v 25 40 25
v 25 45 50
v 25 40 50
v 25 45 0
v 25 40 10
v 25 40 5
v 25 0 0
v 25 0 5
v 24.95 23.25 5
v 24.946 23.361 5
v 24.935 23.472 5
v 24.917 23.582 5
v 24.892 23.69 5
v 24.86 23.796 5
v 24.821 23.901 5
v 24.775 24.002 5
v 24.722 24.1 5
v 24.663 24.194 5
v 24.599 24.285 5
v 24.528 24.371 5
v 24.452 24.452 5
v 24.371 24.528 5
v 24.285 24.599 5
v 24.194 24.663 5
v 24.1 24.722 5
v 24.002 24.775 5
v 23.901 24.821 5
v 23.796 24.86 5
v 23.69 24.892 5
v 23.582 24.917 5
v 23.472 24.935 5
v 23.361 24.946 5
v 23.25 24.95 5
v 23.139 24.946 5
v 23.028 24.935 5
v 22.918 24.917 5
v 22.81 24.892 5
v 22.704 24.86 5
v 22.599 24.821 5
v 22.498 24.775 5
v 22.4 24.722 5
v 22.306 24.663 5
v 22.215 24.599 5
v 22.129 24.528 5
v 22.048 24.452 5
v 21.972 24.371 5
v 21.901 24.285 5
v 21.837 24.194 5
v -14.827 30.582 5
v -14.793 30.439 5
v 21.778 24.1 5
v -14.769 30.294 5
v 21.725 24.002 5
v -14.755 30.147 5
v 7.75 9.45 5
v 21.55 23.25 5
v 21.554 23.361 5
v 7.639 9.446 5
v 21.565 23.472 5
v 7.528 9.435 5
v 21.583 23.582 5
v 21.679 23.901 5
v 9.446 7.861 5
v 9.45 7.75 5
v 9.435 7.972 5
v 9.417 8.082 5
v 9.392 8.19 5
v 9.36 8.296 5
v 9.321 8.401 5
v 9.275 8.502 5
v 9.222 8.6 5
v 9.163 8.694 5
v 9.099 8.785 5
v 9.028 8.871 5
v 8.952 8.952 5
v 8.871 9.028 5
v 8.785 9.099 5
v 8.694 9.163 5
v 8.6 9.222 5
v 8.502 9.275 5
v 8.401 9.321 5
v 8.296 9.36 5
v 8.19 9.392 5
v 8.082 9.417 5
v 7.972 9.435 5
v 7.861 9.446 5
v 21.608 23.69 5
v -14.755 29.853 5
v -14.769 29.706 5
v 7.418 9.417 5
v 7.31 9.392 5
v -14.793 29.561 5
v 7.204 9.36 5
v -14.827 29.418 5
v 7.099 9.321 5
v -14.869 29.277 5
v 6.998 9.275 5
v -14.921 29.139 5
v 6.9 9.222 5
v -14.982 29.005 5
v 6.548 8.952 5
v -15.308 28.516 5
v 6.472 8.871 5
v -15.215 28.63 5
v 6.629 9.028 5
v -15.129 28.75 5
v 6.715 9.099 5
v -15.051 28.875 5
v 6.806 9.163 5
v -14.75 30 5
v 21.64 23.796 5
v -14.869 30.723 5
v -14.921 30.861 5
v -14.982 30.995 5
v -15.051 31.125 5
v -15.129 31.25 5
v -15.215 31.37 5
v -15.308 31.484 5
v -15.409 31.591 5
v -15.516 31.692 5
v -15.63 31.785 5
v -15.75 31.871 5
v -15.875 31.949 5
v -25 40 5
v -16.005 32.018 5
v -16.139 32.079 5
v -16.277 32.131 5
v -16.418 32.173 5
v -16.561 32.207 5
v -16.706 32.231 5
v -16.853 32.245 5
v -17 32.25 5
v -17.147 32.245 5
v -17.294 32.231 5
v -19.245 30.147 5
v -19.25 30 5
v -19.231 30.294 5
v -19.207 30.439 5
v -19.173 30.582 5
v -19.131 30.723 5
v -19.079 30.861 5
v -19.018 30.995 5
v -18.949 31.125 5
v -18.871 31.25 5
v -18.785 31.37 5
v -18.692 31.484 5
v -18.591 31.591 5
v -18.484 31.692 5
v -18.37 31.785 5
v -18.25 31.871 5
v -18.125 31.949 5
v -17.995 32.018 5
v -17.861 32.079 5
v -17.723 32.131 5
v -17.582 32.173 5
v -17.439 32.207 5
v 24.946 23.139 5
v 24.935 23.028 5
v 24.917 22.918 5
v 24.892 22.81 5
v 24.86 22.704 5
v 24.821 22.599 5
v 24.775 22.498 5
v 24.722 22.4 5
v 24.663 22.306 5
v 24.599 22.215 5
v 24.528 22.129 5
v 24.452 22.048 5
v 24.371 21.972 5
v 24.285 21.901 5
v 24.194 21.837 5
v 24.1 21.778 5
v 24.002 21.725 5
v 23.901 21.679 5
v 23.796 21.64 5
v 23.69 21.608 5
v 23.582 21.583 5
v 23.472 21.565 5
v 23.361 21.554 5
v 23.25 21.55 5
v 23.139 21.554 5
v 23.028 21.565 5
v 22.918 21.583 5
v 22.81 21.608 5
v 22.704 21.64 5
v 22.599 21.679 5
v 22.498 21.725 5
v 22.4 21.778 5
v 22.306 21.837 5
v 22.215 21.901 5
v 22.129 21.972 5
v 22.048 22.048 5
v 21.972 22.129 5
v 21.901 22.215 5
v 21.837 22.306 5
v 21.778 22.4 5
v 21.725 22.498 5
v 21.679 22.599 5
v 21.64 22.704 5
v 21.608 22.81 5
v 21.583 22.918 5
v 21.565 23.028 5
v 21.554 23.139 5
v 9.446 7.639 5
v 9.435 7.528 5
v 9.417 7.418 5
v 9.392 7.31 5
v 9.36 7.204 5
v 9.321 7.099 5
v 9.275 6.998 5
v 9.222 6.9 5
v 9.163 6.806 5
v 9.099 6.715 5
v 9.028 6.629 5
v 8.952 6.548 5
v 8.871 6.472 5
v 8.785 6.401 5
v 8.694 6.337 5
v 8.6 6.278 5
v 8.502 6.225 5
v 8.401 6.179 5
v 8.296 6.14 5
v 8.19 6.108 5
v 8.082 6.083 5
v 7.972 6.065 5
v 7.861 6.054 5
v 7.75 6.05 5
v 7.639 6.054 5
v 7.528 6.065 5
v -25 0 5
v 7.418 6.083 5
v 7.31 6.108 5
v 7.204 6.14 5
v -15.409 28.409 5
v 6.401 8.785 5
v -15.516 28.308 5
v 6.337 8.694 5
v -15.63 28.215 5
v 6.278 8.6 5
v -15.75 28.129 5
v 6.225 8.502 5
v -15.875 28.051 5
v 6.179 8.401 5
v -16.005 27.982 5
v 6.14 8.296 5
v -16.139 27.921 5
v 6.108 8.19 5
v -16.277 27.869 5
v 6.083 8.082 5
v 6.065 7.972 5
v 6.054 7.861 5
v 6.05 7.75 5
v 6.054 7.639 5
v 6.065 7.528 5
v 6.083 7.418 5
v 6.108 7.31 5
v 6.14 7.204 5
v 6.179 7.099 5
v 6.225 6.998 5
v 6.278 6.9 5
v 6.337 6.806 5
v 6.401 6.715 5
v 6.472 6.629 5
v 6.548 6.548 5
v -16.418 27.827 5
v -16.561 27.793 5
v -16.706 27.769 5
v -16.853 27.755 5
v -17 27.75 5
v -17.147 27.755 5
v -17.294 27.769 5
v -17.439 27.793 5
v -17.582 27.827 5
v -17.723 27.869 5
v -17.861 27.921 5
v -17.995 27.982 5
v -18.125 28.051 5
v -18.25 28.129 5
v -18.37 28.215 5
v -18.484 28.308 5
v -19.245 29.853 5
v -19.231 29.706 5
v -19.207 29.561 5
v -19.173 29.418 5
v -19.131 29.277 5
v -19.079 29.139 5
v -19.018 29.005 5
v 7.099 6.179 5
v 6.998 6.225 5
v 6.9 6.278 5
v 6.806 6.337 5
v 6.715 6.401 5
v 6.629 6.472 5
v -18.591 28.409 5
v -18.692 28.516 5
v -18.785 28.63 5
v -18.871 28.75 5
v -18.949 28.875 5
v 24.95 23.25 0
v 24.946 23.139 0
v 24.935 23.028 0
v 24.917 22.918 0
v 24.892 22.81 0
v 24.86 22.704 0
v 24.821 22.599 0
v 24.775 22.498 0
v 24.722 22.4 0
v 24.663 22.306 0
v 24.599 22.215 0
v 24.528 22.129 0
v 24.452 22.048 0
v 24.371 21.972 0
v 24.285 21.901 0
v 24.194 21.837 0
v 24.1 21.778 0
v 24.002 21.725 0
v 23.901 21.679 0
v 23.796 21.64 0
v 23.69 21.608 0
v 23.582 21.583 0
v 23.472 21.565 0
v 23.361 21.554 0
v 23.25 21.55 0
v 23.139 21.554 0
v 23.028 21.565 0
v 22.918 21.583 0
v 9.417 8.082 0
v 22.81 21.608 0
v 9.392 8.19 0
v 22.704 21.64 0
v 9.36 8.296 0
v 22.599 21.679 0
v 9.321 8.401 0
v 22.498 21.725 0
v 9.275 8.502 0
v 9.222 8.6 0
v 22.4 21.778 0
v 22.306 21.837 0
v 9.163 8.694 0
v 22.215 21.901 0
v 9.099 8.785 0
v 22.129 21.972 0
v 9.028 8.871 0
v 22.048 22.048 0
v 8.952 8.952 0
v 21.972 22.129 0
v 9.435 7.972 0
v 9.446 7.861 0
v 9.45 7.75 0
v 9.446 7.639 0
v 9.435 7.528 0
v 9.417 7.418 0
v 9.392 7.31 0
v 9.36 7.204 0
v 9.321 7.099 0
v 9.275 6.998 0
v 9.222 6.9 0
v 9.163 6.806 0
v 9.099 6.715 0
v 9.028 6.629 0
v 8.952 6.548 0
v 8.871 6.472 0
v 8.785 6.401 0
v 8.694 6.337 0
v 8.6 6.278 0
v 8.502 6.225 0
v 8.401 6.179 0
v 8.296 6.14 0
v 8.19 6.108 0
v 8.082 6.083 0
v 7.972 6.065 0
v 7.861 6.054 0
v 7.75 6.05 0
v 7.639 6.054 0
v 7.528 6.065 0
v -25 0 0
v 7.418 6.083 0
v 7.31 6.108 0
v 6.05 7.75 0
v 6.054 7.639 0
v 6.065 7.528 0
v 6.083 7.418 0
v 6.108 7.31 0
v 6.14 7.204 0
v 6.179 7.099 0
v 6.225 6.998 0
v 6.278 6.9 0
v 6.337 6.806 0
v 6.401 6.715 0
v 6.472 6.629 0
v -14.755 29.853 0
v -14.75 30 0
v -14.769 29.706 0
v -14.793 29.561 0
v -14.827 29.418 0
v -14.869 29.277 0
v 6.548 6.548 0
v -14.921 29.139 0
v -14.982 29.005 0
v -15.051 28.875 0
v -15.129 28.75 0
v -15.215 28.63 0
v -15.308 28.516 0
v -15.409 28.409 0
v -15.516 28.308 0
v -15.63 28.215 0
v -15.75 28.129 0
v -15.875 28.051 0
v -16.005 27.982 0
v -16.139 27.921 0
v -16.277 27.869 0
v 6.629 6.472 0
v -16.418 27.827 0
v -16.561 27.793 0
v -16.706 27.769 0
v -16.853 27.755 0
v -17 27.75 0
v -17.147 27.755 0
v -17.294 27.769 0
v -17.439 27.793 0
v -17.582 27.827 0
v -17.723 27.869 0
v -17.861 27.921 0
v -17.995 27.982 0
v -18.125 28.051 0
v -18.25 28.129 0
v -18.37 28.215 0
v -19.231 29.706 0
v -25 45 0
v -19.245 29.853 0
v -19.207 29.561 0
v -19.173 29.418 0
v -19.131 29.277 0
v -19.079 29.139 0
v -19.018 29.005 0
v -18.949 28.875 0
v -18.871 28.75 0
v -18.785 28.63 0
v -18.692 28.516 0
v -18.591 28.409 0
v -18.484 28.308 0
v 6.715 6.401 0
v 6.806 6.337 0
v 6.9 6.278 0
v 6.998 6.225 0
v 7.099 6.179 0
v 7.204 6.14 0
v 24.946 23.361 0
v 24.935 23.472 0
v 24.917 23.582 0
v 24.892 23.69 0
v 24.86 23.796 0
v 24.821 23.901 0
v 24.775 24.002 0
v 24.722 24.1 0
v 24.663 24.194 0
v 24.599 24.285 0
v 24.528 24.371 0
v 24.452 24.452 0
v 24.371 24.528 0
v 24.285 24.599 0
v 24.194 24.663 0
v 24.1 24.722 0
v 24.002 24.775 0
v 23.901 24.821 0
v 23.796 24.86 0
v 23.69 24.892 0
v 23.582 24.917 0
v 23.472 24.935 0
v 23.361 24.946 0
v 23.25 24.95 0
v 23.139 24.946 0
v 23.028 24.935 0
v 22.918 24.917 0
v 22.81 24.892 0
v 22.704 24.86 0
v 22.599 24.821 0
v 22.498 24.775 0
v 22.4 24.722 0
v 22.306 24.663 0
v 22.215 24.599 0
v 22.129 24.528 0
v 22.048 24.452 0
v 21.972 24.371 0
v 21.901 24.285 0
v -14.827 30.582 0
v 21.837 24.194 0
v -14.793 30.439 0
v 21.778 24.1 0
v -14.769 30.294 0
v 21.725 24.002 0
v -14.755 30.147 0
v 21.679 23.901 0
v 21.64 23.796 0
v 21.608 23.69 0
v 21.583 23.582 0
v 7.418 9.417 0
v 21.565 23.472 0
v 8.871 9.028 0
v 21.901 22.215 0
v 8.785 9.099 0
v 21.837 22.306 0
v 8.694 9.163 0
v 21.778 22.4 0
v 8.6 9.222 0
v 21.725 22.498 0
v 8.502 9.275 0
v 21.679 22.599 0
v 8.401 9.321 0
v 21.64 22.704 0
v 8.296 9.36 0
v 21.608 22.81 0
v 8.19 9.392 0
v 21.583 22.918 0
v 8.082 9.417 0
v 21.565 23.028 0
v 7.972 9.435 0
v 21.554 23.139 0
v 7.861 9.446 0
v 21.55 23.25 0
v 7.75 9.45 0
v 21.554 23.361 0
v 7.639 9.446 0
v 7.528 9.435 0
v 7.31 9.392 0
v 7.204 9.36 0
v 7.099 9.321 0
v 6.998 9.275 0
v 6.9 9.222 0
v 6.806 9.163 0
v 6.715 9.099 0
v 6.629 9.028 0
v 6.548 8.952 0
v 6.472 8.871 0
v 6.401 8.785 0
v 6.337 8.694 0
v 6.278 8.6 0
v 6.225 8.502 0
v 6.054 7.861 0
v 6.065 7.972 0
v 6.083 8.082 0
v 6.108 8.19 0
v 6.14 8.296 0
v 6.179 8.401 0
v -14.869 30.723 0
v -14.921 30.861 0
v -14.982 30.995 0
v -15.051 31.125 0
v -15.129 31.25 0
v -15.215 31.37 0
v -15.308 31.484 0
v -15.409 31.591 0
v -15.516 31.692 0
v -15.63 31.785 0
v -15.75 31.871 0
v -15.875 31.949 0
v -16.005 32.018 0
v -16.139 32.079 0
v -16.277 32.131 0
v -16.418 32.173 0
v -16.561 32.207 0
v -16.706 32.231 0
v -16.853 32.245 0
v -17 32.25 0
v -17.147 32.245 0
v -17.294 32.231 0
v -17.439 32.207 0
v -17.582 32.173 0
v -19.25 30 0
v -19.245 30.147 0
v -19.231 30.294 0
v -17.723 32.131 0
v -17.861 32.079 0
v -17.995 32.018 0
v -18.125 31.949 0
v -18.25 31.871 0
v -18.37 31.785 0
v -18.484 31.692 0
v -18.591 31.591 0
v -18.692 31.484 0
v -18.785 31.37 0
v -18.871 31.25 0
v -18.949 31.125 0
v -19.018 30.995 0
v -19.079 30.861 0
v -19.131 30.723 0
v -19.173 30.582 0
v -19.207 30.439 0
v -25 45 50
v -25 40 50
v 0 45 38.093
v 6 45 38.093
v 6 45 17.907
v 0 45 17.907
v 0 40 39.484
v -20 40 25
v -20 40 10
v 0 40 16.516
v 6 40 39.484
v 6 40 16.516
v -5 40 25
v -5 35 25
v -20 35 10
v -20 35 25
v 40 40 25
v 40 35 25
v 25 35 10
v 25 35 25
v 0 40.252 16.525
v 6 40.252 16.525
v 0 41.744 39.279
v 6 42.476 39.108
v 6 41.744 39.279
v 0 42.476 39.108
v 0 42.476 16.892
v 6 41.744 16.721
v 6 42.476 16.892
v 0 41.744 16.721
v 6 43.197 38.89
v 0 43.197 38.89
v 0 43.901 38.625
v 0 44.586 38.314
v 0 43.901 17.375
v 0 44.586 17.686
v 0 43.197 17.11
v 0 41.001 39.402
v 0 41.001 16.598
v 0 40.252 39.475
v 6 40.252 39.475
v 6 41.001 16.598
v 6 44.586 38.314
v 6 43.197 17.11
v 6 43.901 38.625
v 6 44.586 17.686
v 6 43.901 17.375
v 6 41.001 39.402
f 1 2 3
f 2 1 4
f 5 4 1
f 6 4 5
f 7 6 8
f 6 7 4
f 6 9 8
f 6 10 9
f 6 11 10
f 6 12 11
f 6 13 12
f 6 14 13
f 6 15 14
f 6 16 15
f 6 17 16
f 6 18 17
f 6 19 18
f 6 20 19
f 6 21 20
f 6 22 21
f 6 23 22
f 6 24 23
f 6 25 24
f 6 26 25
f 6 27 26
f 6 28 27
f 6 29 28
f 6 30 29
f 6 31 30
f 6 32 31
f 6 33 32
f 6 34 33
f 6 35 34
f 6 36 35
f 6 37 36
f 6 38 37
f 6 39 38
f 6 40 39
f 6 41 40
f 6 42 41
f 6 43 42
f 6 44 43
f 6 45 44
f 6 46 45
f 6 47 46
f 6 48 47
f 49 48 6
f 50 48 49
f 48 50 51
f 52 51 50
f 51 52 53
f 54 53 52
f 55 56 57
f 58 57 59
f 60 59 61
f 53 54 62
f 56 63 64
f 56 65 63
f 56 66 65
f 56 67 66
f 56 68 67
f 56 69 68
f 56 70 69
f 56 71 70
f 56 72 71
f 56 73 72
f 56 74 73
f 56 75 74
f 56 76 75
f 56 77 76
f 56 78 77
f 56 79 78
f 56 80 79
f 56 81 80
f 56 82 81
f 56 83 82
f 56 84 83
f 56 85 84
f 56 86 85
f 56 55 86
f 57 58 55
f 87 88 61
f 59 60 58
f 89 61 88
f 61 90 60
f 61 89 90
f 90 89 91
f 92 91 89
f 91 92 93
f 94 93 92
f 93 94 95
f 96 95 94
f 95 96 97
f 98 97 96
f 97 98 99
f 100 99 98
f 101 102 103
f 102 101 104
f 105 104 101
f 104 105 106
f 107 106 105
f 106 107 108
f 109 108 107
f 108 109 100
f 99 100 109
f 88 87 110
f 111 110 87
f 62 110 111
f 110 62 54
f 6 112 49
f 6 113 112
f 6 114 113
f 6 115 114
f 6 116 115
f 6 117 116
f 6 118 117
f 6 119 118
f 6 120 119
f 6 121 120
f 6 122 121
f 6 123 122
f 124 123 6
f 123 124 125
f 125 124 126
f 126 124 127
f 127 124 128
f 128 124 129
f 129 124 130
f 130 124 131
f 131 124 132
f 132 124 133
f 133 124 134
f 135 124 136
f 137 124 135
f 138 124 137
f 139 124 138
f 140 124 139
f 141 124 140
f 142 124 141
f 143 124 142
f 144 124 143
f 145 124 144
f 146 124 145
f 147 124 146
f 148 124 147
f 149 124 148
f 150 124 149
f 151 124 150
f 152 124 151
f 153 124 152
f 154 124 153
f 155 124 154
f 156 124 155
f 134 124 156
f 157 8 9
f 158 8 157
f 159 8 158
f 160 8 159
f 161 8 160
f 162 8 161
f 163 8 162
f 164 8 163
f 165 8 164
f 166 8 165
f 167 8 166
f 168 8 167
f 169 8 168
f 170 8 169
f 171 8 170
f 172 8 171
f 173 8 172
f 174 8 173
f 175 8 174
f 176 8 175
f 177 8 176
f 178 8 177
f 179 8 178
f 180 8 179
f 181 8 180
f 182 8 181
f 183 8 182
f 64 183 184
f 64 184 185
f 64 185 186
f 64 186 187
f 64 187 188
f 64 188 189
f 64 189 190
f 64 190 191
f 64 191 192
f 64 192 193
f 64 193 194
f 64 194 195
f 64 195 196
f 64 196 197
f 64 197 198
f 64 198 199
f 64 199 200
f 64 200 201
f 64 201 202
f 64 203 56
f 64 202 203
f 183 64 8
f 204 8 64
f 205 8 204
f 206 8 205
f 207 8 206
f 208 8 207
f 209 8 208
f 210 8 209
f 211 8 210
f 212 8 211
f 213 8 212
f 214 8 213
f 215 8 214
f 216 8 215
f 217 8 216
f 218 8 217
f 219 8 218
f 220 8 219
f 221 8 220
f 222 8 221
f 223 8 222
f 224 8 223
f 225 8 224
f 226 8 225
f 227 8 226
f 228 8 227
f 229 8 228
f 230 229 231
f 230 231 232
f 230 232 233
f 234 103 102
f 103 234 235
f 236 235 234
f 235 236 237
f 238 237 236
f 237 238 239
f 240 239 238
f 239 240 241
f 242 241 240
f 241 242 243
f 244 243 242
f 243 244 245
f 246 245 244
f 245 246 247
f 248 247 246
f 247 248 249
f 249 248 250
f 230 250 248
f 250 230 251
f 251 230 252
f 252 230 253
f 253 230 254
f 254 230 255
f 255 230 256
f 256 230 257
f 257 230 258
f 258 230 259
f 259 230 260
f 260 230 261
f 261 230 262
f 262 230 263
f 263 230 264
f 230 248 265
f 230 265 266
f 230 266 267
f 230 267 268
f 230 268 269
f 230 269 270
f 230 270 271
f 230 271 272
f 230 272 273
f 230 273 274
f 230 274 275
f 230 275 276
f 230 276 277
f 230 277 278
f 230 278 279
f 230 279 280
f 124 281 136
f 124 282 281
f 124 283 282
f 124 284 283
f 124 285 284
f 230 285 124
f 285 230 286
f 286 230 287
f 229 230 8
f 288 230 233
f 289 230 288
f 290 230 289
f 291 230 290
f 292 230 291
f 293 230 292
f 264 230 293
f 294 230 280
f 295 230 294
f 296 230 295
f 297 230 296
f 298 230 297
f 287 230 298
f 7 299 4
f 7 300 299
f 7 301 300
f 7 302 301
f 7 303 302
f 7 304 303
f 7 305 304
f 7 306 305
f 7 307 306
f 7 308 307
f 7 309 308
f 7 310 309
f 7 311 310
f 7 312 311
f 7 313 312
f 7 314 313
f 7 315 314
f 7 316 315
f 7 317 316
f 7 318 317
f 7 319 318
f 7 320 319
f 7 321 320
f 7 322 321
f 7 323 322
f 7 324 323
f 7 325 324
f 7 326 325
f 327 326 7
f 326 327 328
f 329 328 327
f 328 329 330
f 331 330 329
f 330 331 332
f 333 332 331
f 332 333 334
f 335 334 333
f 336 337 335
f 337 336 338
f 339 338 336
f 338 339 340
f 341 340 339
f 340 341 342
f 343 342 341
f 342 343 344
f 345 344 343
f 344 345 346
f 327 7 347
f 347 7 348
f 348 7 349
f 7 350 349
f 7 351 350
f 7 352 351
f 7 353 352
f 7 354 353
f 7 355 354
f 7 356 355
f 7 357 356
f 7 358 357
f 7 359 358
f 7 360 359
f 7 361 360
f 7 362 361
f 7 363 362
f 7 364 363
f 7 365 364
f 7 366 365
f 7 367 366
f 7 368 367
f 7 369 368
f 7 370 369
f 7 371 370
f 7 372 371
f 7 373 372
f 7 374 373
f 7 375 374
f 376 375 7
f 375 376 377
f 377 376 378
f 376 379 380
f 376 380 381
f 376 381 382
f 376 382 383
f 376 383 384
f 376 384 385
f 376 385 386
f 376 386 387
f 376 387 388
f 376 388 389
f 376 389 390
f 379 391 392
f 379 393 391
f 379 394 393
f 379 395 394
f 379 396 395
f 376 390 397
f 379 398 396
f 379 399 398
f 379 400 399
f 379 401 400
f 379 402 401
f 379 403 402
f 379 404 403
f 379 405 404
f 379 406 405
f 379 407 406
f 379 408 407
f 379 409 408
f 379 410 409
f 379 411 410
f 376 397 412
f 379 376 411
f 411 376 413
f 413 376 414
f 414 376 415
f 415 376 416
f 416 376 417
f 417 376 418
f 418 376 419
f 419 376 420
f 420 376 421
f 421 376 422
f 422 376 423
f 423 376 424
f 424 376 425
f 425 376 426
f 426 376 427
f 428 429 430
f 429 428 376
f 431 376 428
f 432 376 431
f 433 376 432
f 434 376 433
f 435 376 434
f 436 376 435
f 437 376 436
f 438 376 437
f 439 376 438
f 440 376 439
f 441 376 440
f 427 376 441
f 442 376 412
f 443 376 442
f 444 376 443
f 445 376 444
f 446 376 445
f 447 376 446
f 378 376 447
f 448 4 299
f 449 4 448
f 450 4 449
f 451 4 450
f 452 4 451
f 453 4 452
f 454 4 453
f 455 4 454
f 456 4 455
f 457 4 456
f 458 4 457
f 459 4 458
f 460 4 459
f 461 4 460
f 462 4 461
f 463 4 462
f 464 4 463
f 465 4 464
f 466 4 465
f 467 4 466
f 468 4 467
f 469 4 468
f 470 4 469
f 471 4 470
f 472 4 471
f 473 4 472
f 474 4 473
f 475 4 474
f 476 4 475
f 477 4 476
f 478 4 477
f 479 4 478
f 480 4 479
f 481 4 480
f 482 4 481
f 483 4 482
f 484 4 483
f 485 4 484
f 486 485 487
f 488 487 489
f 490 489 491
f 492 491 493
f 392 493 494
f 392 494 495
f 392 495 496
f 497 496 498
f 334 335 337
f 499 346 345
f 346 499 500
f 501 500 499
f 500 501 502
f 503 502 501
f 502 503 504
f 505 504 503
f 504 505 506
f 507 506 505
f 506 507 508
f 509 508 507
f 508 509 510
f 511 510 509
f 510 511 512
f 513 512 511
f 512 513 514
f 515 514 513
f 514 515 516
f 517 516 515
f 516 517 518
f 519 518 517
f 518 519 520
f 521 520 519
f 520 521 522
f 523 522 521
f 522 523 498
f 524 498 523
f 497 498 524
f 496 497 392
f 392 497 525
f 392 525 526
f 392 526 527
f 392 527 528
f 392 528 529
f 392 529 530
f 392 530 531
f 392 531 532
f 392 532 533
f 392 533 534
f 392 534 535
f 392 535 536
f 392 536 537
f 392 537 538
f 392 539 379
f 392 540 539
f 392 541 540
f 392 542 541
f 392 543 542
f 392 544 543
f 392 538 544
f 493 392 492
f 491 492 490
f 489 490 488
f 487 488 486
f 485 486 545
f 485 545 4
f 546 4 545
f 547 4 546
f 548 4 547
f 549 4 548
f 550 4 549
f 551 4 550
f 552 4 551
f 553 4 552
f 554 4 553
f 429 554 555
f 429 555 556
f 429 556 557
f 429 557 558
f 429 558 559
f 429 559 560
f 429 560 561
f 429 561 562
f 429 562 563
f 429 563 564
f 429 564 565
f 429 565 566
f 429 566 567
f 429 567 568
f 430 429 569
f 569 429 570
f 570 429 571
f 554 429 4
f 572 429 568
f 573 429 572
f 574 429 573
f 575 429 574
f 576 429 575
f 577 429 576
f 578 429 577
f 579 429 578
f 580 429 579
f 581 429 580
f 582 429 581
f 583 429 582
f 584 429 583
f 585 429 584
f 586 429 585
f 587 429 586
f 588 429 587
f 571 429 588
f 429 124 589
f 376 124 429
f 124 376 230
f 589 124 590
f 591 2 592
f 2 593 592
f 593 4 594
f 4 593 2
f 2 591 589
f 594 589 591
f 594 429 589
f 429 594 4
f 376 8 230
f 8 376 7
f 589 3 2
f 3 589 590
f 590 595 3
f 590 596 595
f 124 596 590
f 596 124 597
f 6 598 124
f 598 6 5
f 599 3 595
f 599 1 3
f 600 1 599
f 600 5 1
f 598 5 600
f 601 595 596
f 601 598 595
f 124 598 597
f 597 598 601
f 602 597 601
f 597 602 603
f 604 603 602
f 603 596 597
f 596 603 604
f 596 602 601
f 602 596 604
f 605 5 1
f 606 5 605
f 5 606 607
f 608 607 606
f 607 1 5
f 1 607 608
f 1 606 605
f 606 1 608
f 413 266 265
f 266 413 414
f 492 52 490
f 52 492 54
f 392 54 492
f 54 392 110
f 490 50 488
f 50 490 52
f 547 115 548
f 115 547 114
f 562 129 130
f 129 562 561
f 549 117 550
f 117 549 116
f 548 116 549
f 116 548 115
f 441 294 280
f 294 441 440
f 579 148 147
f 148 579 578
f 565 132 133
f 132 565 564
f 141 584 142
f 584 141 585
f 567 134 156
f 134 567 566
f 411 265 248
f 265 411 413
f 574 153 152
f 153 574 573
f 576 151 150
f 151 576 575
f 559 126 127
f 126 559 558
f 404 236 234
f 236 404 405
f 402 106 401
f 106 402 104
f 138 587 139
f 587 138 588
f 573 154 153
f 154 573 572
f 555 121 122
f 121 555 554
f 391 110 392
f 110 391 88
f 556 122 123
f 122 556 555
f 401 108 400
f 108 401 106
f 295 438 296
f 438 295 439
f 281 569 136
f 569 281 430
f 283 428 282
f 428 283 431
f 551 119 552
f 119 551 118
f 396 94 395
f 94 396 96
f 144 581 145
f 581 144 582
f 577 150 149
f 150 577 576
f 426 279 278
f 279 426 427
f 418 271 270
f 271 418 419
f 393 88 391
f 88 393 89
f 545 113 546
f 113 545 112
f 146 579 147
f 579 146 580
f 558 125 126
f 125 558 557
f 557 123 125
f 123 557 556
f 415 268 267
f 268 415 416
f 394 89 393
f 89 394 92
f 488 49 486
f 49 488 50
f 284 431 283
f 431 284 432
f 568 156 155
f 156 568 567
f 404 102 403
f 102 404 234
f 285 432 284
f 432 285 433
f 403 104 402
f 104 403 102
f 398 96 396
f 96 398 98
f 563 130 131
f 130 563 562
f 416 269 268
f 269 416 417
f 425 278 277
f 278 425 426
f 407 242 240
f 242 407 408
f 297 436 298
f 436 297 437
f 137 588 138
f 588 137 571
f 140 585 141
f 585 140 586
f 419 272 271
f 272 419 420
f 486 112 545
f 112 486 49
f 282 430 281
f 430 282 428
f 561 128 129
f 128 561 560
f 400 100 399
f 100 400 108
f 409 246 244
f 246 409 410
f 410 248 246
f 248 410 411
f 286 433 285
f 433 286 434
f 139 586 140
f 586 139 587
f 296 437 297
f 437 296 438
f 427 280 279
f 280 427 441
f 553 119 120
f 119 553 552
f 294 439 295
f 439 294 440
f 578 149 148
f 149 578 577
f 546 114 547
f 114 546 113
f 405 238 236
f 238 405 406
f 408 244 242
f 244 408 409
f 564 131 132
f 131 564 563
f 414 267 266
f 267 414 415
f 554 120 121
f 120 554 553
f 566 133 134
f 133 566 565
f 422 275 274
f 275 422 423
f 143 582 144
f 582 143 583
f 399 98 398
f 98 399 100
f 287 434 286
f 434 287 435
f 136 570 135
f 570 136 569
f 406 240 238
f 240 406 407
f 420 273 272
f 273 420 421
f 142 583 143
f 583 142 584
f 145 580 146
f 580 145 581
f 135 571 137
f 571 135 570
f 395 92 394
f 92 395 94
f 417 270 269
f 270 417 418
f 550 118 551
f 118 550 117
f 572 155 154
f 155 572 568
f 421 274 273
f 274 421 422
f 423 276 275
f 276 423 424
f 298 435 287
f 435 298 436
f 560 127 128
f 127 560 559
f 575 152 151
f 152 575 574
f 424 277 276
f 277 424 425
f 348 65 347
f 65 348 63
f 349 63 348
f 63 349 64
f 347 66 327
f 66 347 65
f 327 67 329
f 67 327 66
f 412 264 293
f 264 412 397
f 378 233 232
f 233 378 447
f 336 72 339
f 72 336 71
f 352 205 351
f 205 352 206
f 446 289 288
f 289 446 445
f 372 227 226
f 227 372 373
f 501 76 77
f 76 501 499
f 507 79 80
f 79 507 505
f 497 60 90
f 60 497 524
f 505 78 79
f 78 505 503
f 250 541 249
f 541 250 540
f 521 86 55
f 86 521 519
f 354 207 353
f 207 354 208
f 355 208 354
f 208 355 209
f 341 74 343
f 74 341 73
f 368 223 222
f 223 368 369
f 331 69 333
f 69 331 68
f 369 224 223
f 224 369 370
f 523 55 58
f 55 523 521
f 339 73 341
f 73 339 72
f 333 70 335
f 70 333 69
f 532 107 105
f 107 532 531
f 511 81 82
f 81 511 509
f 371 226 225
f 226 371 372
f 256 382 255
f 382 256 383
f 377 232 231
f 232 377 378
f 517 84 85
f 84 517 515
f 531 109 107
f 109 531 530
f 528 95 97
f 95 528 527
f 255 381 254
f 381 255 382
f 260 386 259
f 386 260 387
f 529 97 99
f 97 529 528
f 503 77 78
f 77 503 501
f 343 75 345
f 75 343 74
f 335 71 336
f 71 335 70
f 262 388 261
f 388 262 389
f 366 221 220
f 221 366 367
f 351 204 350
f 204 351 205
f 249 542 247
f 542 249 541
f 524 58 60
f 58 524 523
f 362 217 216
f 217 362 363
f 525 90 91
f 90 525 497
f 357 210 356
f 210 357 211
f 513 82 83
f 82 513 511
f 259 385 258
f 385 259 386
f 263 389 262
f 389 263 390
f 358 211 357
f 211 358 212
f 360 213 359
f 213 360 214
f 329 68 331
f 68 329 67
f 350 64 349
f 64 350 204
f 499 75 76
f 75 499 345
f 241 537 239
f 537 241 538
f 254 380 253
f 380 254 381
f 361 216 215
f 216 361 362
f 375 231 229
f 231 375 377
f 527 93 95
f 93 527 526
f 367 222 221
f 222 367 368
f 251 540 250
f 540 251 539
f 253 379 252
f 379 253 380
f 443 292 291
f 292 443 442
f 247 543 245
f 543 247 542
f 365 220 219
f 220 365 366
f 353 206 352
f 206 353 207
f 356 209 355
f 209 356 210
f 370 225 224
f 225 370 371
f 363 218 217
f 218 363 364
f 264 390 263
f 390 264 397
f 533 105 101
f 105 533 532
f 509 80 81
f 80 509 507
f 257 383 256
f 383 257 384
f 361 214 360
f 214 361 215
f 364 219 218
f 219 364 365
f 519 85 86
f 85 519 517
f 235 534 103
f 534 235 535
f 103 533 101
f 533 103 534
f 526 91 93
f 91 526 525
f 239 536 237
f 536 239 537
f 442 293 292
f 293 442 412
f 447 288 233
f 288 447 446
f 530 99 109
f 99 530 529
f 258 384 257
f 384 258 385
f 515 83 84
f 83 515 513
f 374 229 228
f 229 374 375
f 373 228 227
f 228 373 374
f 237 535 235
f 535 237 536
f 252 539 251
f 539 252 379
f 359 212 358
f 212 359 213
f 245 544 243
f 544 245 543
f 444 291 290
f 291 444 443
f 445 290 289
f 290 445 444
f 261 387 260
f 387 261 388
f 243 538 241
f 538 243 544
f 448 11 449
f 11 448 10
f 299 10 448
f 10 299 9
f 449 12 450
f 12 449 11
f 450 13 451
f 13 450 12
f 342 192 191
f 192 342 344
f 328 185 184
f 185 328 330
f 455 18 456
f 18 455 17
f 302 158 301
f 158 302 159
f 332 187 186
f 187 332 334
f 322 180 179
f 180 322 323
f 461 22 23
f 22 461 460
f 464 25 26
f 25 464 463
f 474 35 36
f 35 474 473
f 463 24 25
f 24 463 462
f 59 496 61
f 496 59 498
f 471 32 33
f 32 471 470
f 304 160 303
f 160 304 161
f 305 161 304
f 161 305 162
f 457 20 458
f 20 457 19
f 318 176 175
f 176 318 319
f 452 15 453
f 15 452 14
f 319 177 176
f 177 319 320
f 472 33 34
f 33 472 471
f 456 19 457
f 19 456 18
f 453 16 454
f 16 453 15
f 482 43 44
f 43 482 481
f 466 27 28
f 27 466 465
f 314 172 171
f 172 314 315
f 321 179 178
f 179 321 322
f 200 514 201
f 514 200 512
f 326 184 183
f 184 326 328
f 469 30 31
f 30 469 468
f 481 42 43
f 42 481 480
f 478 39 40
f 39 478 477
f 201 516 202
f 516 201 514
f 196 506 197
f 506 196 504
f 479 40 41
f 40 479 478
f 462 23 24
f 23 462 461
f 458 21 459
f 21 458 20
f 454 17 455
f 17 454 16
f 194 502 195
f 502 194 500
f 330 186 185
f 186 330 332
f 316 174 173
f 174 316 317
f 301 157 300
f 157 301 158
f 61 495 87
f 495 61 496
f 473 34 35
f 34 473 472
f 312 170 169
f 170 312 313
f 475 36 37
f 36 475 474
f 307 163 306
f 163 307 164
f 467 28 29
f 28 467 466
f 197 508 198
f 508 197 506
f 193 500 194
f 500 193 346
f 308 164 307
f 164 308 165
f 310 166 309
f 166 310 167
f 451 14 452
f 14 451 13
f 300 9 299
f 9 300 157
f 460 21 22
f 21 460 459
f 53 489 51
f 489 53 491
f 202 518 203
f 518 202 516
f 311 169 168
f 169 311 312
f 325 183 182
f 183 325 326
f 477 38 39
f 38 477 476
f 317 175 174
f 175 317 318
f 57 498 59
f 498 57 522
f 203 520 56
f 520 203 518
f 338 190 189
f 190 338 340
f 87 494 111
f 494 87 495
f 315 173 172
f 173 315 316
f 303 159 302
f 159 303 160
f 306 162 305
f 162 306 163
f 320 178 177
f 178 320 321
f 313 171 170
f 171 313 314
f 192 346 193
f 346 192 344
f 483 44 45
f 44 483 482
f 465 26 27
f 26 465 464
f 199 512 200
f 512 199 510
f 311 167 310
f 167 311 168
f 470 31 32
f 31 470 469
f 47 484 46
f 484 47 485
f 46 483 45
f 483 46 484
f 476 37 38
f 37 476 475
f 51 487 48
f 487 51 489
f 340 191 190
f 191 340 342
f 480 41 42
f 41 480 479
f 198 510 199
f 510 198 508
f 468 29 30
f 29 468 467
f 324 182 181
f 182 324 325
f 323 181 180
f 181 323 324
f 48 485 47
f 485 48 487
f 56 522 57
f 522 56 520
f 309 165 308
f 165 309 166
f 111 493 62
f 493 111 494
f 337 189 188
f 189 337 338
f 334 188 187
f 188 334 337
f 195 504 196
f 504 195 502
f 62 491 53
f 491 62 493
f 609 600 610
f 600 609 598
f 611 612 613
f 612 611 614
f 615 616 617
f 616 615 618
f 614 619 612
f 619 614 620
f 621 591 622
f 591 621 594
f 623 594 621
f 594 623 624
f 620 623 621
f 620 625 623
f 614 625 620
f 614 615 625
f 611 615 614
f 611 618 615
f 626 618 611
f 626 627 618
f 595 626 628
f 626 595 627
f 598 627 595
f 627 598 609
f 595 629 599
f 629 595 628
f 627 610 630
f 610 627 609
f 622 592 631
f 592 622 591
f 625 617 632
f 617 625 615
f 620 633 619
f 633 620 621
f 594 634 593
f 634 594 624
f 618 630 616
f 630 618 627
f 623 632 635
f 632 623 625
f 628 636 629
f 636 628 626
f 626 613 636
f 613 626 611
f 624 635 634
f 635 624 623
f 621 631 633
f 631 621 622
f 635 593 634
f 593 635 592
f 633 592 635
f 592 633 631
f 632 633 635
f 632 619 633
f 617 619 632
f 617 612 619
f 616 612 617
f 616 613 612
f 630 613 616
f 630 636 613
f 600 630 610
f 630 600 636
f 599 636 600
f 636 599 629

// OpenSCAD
// L-shaped mounting bracket for NEMA 17 stepper motor (syringe pump)
// Print orientation: base plate on bed, motor plate building up in +Z

// ---------------- Parameters ----------------
plate_x      = 25;    // base plate half-width (X)
plate_y      = 45;    // base plate length (Y)
plate_t      = 5;     // base plate thickness (Z)

motor_h      = 50;    // motor plate height (Z)
motor_w      = 5;     // motor plate thickness (Y)

boss_d       = 23;    // motor boss hole diameter
boss_x       = 0;     // boss hole X position
boss_z       = 28;    // boss hole Z position

screw_d      = 3.4;   // M3 screw hole diameter
screw_p      = 31;    // square pattern side length
screw_n      = 4;     // number of screw holes

gusset_t     = 5;     // gusset thickness (X)
gusset_y     = 20;    // gusset leg along +Y
gusset_z     = 20;    // gusset leg along +Z

eps          = 0.5;   // cutter overshoot past faces

$fn = 96;

// ---------------- Model ----------------
difference() {
    union() {
        // Base plate
        translate([-plate_x, 0, 0])
            cube([plate_x * 2, plate_y, plate_t]);

        // Motor plate (standing on back edge of base)
        translate([-plate_x, plate_y - motor_w, 0])
            cube([plate_x * 2, motor_w, motor_h]);

        // Left gusset (flush with left edge, right-angle at y = 5, z = 5)
        translate([-plate_x, plate_y - motor_w, plate_t])
            rotate([90, 0, 0])
                linear_extrude(height = gusset_t)
                    polygon([[gusset_y, gusset_z], [plate_t, gusset_z], [plate_t, plate_t]]);

        // Right gusset (flush with right edge)
        translate([plate_x - gusset_t, plate_y - motor_w, plate_t])
            rotate([90, 0, 0])
                linear_extrude(height = gusset_t)
                    polygon([[gusset_y, gusset_z], [plate_t, gusset_z], [plate_t, plate_t]]);
    }

    // Base plate through-holes (M4)
    for (h = [plate_t, motor_h])
        translate([-17, 30, -eps])
            cylinder(d = 4.5, h = h + 2 * eps);

    // Motor boss hole (along Y)
    translate([boss_x, plate_y - motor_w - eps, boss_z])
        rotate([0, 90, 0])
            cylinder(d = boss_d, h = motor_w + 2 * eps);

    // M3 screw holes on square pattern centred on boss hole
    for (i = [0 : screw_n - 1])
        translate([(i - (screw_n - 1) / 2) * screw_p / 2,
                   (i - (screw_n - 1) / 2) * screw_p / 2,
                   -eps])
            cylinder(d = screw_d, h = motor_h + 2 * eps);
}
